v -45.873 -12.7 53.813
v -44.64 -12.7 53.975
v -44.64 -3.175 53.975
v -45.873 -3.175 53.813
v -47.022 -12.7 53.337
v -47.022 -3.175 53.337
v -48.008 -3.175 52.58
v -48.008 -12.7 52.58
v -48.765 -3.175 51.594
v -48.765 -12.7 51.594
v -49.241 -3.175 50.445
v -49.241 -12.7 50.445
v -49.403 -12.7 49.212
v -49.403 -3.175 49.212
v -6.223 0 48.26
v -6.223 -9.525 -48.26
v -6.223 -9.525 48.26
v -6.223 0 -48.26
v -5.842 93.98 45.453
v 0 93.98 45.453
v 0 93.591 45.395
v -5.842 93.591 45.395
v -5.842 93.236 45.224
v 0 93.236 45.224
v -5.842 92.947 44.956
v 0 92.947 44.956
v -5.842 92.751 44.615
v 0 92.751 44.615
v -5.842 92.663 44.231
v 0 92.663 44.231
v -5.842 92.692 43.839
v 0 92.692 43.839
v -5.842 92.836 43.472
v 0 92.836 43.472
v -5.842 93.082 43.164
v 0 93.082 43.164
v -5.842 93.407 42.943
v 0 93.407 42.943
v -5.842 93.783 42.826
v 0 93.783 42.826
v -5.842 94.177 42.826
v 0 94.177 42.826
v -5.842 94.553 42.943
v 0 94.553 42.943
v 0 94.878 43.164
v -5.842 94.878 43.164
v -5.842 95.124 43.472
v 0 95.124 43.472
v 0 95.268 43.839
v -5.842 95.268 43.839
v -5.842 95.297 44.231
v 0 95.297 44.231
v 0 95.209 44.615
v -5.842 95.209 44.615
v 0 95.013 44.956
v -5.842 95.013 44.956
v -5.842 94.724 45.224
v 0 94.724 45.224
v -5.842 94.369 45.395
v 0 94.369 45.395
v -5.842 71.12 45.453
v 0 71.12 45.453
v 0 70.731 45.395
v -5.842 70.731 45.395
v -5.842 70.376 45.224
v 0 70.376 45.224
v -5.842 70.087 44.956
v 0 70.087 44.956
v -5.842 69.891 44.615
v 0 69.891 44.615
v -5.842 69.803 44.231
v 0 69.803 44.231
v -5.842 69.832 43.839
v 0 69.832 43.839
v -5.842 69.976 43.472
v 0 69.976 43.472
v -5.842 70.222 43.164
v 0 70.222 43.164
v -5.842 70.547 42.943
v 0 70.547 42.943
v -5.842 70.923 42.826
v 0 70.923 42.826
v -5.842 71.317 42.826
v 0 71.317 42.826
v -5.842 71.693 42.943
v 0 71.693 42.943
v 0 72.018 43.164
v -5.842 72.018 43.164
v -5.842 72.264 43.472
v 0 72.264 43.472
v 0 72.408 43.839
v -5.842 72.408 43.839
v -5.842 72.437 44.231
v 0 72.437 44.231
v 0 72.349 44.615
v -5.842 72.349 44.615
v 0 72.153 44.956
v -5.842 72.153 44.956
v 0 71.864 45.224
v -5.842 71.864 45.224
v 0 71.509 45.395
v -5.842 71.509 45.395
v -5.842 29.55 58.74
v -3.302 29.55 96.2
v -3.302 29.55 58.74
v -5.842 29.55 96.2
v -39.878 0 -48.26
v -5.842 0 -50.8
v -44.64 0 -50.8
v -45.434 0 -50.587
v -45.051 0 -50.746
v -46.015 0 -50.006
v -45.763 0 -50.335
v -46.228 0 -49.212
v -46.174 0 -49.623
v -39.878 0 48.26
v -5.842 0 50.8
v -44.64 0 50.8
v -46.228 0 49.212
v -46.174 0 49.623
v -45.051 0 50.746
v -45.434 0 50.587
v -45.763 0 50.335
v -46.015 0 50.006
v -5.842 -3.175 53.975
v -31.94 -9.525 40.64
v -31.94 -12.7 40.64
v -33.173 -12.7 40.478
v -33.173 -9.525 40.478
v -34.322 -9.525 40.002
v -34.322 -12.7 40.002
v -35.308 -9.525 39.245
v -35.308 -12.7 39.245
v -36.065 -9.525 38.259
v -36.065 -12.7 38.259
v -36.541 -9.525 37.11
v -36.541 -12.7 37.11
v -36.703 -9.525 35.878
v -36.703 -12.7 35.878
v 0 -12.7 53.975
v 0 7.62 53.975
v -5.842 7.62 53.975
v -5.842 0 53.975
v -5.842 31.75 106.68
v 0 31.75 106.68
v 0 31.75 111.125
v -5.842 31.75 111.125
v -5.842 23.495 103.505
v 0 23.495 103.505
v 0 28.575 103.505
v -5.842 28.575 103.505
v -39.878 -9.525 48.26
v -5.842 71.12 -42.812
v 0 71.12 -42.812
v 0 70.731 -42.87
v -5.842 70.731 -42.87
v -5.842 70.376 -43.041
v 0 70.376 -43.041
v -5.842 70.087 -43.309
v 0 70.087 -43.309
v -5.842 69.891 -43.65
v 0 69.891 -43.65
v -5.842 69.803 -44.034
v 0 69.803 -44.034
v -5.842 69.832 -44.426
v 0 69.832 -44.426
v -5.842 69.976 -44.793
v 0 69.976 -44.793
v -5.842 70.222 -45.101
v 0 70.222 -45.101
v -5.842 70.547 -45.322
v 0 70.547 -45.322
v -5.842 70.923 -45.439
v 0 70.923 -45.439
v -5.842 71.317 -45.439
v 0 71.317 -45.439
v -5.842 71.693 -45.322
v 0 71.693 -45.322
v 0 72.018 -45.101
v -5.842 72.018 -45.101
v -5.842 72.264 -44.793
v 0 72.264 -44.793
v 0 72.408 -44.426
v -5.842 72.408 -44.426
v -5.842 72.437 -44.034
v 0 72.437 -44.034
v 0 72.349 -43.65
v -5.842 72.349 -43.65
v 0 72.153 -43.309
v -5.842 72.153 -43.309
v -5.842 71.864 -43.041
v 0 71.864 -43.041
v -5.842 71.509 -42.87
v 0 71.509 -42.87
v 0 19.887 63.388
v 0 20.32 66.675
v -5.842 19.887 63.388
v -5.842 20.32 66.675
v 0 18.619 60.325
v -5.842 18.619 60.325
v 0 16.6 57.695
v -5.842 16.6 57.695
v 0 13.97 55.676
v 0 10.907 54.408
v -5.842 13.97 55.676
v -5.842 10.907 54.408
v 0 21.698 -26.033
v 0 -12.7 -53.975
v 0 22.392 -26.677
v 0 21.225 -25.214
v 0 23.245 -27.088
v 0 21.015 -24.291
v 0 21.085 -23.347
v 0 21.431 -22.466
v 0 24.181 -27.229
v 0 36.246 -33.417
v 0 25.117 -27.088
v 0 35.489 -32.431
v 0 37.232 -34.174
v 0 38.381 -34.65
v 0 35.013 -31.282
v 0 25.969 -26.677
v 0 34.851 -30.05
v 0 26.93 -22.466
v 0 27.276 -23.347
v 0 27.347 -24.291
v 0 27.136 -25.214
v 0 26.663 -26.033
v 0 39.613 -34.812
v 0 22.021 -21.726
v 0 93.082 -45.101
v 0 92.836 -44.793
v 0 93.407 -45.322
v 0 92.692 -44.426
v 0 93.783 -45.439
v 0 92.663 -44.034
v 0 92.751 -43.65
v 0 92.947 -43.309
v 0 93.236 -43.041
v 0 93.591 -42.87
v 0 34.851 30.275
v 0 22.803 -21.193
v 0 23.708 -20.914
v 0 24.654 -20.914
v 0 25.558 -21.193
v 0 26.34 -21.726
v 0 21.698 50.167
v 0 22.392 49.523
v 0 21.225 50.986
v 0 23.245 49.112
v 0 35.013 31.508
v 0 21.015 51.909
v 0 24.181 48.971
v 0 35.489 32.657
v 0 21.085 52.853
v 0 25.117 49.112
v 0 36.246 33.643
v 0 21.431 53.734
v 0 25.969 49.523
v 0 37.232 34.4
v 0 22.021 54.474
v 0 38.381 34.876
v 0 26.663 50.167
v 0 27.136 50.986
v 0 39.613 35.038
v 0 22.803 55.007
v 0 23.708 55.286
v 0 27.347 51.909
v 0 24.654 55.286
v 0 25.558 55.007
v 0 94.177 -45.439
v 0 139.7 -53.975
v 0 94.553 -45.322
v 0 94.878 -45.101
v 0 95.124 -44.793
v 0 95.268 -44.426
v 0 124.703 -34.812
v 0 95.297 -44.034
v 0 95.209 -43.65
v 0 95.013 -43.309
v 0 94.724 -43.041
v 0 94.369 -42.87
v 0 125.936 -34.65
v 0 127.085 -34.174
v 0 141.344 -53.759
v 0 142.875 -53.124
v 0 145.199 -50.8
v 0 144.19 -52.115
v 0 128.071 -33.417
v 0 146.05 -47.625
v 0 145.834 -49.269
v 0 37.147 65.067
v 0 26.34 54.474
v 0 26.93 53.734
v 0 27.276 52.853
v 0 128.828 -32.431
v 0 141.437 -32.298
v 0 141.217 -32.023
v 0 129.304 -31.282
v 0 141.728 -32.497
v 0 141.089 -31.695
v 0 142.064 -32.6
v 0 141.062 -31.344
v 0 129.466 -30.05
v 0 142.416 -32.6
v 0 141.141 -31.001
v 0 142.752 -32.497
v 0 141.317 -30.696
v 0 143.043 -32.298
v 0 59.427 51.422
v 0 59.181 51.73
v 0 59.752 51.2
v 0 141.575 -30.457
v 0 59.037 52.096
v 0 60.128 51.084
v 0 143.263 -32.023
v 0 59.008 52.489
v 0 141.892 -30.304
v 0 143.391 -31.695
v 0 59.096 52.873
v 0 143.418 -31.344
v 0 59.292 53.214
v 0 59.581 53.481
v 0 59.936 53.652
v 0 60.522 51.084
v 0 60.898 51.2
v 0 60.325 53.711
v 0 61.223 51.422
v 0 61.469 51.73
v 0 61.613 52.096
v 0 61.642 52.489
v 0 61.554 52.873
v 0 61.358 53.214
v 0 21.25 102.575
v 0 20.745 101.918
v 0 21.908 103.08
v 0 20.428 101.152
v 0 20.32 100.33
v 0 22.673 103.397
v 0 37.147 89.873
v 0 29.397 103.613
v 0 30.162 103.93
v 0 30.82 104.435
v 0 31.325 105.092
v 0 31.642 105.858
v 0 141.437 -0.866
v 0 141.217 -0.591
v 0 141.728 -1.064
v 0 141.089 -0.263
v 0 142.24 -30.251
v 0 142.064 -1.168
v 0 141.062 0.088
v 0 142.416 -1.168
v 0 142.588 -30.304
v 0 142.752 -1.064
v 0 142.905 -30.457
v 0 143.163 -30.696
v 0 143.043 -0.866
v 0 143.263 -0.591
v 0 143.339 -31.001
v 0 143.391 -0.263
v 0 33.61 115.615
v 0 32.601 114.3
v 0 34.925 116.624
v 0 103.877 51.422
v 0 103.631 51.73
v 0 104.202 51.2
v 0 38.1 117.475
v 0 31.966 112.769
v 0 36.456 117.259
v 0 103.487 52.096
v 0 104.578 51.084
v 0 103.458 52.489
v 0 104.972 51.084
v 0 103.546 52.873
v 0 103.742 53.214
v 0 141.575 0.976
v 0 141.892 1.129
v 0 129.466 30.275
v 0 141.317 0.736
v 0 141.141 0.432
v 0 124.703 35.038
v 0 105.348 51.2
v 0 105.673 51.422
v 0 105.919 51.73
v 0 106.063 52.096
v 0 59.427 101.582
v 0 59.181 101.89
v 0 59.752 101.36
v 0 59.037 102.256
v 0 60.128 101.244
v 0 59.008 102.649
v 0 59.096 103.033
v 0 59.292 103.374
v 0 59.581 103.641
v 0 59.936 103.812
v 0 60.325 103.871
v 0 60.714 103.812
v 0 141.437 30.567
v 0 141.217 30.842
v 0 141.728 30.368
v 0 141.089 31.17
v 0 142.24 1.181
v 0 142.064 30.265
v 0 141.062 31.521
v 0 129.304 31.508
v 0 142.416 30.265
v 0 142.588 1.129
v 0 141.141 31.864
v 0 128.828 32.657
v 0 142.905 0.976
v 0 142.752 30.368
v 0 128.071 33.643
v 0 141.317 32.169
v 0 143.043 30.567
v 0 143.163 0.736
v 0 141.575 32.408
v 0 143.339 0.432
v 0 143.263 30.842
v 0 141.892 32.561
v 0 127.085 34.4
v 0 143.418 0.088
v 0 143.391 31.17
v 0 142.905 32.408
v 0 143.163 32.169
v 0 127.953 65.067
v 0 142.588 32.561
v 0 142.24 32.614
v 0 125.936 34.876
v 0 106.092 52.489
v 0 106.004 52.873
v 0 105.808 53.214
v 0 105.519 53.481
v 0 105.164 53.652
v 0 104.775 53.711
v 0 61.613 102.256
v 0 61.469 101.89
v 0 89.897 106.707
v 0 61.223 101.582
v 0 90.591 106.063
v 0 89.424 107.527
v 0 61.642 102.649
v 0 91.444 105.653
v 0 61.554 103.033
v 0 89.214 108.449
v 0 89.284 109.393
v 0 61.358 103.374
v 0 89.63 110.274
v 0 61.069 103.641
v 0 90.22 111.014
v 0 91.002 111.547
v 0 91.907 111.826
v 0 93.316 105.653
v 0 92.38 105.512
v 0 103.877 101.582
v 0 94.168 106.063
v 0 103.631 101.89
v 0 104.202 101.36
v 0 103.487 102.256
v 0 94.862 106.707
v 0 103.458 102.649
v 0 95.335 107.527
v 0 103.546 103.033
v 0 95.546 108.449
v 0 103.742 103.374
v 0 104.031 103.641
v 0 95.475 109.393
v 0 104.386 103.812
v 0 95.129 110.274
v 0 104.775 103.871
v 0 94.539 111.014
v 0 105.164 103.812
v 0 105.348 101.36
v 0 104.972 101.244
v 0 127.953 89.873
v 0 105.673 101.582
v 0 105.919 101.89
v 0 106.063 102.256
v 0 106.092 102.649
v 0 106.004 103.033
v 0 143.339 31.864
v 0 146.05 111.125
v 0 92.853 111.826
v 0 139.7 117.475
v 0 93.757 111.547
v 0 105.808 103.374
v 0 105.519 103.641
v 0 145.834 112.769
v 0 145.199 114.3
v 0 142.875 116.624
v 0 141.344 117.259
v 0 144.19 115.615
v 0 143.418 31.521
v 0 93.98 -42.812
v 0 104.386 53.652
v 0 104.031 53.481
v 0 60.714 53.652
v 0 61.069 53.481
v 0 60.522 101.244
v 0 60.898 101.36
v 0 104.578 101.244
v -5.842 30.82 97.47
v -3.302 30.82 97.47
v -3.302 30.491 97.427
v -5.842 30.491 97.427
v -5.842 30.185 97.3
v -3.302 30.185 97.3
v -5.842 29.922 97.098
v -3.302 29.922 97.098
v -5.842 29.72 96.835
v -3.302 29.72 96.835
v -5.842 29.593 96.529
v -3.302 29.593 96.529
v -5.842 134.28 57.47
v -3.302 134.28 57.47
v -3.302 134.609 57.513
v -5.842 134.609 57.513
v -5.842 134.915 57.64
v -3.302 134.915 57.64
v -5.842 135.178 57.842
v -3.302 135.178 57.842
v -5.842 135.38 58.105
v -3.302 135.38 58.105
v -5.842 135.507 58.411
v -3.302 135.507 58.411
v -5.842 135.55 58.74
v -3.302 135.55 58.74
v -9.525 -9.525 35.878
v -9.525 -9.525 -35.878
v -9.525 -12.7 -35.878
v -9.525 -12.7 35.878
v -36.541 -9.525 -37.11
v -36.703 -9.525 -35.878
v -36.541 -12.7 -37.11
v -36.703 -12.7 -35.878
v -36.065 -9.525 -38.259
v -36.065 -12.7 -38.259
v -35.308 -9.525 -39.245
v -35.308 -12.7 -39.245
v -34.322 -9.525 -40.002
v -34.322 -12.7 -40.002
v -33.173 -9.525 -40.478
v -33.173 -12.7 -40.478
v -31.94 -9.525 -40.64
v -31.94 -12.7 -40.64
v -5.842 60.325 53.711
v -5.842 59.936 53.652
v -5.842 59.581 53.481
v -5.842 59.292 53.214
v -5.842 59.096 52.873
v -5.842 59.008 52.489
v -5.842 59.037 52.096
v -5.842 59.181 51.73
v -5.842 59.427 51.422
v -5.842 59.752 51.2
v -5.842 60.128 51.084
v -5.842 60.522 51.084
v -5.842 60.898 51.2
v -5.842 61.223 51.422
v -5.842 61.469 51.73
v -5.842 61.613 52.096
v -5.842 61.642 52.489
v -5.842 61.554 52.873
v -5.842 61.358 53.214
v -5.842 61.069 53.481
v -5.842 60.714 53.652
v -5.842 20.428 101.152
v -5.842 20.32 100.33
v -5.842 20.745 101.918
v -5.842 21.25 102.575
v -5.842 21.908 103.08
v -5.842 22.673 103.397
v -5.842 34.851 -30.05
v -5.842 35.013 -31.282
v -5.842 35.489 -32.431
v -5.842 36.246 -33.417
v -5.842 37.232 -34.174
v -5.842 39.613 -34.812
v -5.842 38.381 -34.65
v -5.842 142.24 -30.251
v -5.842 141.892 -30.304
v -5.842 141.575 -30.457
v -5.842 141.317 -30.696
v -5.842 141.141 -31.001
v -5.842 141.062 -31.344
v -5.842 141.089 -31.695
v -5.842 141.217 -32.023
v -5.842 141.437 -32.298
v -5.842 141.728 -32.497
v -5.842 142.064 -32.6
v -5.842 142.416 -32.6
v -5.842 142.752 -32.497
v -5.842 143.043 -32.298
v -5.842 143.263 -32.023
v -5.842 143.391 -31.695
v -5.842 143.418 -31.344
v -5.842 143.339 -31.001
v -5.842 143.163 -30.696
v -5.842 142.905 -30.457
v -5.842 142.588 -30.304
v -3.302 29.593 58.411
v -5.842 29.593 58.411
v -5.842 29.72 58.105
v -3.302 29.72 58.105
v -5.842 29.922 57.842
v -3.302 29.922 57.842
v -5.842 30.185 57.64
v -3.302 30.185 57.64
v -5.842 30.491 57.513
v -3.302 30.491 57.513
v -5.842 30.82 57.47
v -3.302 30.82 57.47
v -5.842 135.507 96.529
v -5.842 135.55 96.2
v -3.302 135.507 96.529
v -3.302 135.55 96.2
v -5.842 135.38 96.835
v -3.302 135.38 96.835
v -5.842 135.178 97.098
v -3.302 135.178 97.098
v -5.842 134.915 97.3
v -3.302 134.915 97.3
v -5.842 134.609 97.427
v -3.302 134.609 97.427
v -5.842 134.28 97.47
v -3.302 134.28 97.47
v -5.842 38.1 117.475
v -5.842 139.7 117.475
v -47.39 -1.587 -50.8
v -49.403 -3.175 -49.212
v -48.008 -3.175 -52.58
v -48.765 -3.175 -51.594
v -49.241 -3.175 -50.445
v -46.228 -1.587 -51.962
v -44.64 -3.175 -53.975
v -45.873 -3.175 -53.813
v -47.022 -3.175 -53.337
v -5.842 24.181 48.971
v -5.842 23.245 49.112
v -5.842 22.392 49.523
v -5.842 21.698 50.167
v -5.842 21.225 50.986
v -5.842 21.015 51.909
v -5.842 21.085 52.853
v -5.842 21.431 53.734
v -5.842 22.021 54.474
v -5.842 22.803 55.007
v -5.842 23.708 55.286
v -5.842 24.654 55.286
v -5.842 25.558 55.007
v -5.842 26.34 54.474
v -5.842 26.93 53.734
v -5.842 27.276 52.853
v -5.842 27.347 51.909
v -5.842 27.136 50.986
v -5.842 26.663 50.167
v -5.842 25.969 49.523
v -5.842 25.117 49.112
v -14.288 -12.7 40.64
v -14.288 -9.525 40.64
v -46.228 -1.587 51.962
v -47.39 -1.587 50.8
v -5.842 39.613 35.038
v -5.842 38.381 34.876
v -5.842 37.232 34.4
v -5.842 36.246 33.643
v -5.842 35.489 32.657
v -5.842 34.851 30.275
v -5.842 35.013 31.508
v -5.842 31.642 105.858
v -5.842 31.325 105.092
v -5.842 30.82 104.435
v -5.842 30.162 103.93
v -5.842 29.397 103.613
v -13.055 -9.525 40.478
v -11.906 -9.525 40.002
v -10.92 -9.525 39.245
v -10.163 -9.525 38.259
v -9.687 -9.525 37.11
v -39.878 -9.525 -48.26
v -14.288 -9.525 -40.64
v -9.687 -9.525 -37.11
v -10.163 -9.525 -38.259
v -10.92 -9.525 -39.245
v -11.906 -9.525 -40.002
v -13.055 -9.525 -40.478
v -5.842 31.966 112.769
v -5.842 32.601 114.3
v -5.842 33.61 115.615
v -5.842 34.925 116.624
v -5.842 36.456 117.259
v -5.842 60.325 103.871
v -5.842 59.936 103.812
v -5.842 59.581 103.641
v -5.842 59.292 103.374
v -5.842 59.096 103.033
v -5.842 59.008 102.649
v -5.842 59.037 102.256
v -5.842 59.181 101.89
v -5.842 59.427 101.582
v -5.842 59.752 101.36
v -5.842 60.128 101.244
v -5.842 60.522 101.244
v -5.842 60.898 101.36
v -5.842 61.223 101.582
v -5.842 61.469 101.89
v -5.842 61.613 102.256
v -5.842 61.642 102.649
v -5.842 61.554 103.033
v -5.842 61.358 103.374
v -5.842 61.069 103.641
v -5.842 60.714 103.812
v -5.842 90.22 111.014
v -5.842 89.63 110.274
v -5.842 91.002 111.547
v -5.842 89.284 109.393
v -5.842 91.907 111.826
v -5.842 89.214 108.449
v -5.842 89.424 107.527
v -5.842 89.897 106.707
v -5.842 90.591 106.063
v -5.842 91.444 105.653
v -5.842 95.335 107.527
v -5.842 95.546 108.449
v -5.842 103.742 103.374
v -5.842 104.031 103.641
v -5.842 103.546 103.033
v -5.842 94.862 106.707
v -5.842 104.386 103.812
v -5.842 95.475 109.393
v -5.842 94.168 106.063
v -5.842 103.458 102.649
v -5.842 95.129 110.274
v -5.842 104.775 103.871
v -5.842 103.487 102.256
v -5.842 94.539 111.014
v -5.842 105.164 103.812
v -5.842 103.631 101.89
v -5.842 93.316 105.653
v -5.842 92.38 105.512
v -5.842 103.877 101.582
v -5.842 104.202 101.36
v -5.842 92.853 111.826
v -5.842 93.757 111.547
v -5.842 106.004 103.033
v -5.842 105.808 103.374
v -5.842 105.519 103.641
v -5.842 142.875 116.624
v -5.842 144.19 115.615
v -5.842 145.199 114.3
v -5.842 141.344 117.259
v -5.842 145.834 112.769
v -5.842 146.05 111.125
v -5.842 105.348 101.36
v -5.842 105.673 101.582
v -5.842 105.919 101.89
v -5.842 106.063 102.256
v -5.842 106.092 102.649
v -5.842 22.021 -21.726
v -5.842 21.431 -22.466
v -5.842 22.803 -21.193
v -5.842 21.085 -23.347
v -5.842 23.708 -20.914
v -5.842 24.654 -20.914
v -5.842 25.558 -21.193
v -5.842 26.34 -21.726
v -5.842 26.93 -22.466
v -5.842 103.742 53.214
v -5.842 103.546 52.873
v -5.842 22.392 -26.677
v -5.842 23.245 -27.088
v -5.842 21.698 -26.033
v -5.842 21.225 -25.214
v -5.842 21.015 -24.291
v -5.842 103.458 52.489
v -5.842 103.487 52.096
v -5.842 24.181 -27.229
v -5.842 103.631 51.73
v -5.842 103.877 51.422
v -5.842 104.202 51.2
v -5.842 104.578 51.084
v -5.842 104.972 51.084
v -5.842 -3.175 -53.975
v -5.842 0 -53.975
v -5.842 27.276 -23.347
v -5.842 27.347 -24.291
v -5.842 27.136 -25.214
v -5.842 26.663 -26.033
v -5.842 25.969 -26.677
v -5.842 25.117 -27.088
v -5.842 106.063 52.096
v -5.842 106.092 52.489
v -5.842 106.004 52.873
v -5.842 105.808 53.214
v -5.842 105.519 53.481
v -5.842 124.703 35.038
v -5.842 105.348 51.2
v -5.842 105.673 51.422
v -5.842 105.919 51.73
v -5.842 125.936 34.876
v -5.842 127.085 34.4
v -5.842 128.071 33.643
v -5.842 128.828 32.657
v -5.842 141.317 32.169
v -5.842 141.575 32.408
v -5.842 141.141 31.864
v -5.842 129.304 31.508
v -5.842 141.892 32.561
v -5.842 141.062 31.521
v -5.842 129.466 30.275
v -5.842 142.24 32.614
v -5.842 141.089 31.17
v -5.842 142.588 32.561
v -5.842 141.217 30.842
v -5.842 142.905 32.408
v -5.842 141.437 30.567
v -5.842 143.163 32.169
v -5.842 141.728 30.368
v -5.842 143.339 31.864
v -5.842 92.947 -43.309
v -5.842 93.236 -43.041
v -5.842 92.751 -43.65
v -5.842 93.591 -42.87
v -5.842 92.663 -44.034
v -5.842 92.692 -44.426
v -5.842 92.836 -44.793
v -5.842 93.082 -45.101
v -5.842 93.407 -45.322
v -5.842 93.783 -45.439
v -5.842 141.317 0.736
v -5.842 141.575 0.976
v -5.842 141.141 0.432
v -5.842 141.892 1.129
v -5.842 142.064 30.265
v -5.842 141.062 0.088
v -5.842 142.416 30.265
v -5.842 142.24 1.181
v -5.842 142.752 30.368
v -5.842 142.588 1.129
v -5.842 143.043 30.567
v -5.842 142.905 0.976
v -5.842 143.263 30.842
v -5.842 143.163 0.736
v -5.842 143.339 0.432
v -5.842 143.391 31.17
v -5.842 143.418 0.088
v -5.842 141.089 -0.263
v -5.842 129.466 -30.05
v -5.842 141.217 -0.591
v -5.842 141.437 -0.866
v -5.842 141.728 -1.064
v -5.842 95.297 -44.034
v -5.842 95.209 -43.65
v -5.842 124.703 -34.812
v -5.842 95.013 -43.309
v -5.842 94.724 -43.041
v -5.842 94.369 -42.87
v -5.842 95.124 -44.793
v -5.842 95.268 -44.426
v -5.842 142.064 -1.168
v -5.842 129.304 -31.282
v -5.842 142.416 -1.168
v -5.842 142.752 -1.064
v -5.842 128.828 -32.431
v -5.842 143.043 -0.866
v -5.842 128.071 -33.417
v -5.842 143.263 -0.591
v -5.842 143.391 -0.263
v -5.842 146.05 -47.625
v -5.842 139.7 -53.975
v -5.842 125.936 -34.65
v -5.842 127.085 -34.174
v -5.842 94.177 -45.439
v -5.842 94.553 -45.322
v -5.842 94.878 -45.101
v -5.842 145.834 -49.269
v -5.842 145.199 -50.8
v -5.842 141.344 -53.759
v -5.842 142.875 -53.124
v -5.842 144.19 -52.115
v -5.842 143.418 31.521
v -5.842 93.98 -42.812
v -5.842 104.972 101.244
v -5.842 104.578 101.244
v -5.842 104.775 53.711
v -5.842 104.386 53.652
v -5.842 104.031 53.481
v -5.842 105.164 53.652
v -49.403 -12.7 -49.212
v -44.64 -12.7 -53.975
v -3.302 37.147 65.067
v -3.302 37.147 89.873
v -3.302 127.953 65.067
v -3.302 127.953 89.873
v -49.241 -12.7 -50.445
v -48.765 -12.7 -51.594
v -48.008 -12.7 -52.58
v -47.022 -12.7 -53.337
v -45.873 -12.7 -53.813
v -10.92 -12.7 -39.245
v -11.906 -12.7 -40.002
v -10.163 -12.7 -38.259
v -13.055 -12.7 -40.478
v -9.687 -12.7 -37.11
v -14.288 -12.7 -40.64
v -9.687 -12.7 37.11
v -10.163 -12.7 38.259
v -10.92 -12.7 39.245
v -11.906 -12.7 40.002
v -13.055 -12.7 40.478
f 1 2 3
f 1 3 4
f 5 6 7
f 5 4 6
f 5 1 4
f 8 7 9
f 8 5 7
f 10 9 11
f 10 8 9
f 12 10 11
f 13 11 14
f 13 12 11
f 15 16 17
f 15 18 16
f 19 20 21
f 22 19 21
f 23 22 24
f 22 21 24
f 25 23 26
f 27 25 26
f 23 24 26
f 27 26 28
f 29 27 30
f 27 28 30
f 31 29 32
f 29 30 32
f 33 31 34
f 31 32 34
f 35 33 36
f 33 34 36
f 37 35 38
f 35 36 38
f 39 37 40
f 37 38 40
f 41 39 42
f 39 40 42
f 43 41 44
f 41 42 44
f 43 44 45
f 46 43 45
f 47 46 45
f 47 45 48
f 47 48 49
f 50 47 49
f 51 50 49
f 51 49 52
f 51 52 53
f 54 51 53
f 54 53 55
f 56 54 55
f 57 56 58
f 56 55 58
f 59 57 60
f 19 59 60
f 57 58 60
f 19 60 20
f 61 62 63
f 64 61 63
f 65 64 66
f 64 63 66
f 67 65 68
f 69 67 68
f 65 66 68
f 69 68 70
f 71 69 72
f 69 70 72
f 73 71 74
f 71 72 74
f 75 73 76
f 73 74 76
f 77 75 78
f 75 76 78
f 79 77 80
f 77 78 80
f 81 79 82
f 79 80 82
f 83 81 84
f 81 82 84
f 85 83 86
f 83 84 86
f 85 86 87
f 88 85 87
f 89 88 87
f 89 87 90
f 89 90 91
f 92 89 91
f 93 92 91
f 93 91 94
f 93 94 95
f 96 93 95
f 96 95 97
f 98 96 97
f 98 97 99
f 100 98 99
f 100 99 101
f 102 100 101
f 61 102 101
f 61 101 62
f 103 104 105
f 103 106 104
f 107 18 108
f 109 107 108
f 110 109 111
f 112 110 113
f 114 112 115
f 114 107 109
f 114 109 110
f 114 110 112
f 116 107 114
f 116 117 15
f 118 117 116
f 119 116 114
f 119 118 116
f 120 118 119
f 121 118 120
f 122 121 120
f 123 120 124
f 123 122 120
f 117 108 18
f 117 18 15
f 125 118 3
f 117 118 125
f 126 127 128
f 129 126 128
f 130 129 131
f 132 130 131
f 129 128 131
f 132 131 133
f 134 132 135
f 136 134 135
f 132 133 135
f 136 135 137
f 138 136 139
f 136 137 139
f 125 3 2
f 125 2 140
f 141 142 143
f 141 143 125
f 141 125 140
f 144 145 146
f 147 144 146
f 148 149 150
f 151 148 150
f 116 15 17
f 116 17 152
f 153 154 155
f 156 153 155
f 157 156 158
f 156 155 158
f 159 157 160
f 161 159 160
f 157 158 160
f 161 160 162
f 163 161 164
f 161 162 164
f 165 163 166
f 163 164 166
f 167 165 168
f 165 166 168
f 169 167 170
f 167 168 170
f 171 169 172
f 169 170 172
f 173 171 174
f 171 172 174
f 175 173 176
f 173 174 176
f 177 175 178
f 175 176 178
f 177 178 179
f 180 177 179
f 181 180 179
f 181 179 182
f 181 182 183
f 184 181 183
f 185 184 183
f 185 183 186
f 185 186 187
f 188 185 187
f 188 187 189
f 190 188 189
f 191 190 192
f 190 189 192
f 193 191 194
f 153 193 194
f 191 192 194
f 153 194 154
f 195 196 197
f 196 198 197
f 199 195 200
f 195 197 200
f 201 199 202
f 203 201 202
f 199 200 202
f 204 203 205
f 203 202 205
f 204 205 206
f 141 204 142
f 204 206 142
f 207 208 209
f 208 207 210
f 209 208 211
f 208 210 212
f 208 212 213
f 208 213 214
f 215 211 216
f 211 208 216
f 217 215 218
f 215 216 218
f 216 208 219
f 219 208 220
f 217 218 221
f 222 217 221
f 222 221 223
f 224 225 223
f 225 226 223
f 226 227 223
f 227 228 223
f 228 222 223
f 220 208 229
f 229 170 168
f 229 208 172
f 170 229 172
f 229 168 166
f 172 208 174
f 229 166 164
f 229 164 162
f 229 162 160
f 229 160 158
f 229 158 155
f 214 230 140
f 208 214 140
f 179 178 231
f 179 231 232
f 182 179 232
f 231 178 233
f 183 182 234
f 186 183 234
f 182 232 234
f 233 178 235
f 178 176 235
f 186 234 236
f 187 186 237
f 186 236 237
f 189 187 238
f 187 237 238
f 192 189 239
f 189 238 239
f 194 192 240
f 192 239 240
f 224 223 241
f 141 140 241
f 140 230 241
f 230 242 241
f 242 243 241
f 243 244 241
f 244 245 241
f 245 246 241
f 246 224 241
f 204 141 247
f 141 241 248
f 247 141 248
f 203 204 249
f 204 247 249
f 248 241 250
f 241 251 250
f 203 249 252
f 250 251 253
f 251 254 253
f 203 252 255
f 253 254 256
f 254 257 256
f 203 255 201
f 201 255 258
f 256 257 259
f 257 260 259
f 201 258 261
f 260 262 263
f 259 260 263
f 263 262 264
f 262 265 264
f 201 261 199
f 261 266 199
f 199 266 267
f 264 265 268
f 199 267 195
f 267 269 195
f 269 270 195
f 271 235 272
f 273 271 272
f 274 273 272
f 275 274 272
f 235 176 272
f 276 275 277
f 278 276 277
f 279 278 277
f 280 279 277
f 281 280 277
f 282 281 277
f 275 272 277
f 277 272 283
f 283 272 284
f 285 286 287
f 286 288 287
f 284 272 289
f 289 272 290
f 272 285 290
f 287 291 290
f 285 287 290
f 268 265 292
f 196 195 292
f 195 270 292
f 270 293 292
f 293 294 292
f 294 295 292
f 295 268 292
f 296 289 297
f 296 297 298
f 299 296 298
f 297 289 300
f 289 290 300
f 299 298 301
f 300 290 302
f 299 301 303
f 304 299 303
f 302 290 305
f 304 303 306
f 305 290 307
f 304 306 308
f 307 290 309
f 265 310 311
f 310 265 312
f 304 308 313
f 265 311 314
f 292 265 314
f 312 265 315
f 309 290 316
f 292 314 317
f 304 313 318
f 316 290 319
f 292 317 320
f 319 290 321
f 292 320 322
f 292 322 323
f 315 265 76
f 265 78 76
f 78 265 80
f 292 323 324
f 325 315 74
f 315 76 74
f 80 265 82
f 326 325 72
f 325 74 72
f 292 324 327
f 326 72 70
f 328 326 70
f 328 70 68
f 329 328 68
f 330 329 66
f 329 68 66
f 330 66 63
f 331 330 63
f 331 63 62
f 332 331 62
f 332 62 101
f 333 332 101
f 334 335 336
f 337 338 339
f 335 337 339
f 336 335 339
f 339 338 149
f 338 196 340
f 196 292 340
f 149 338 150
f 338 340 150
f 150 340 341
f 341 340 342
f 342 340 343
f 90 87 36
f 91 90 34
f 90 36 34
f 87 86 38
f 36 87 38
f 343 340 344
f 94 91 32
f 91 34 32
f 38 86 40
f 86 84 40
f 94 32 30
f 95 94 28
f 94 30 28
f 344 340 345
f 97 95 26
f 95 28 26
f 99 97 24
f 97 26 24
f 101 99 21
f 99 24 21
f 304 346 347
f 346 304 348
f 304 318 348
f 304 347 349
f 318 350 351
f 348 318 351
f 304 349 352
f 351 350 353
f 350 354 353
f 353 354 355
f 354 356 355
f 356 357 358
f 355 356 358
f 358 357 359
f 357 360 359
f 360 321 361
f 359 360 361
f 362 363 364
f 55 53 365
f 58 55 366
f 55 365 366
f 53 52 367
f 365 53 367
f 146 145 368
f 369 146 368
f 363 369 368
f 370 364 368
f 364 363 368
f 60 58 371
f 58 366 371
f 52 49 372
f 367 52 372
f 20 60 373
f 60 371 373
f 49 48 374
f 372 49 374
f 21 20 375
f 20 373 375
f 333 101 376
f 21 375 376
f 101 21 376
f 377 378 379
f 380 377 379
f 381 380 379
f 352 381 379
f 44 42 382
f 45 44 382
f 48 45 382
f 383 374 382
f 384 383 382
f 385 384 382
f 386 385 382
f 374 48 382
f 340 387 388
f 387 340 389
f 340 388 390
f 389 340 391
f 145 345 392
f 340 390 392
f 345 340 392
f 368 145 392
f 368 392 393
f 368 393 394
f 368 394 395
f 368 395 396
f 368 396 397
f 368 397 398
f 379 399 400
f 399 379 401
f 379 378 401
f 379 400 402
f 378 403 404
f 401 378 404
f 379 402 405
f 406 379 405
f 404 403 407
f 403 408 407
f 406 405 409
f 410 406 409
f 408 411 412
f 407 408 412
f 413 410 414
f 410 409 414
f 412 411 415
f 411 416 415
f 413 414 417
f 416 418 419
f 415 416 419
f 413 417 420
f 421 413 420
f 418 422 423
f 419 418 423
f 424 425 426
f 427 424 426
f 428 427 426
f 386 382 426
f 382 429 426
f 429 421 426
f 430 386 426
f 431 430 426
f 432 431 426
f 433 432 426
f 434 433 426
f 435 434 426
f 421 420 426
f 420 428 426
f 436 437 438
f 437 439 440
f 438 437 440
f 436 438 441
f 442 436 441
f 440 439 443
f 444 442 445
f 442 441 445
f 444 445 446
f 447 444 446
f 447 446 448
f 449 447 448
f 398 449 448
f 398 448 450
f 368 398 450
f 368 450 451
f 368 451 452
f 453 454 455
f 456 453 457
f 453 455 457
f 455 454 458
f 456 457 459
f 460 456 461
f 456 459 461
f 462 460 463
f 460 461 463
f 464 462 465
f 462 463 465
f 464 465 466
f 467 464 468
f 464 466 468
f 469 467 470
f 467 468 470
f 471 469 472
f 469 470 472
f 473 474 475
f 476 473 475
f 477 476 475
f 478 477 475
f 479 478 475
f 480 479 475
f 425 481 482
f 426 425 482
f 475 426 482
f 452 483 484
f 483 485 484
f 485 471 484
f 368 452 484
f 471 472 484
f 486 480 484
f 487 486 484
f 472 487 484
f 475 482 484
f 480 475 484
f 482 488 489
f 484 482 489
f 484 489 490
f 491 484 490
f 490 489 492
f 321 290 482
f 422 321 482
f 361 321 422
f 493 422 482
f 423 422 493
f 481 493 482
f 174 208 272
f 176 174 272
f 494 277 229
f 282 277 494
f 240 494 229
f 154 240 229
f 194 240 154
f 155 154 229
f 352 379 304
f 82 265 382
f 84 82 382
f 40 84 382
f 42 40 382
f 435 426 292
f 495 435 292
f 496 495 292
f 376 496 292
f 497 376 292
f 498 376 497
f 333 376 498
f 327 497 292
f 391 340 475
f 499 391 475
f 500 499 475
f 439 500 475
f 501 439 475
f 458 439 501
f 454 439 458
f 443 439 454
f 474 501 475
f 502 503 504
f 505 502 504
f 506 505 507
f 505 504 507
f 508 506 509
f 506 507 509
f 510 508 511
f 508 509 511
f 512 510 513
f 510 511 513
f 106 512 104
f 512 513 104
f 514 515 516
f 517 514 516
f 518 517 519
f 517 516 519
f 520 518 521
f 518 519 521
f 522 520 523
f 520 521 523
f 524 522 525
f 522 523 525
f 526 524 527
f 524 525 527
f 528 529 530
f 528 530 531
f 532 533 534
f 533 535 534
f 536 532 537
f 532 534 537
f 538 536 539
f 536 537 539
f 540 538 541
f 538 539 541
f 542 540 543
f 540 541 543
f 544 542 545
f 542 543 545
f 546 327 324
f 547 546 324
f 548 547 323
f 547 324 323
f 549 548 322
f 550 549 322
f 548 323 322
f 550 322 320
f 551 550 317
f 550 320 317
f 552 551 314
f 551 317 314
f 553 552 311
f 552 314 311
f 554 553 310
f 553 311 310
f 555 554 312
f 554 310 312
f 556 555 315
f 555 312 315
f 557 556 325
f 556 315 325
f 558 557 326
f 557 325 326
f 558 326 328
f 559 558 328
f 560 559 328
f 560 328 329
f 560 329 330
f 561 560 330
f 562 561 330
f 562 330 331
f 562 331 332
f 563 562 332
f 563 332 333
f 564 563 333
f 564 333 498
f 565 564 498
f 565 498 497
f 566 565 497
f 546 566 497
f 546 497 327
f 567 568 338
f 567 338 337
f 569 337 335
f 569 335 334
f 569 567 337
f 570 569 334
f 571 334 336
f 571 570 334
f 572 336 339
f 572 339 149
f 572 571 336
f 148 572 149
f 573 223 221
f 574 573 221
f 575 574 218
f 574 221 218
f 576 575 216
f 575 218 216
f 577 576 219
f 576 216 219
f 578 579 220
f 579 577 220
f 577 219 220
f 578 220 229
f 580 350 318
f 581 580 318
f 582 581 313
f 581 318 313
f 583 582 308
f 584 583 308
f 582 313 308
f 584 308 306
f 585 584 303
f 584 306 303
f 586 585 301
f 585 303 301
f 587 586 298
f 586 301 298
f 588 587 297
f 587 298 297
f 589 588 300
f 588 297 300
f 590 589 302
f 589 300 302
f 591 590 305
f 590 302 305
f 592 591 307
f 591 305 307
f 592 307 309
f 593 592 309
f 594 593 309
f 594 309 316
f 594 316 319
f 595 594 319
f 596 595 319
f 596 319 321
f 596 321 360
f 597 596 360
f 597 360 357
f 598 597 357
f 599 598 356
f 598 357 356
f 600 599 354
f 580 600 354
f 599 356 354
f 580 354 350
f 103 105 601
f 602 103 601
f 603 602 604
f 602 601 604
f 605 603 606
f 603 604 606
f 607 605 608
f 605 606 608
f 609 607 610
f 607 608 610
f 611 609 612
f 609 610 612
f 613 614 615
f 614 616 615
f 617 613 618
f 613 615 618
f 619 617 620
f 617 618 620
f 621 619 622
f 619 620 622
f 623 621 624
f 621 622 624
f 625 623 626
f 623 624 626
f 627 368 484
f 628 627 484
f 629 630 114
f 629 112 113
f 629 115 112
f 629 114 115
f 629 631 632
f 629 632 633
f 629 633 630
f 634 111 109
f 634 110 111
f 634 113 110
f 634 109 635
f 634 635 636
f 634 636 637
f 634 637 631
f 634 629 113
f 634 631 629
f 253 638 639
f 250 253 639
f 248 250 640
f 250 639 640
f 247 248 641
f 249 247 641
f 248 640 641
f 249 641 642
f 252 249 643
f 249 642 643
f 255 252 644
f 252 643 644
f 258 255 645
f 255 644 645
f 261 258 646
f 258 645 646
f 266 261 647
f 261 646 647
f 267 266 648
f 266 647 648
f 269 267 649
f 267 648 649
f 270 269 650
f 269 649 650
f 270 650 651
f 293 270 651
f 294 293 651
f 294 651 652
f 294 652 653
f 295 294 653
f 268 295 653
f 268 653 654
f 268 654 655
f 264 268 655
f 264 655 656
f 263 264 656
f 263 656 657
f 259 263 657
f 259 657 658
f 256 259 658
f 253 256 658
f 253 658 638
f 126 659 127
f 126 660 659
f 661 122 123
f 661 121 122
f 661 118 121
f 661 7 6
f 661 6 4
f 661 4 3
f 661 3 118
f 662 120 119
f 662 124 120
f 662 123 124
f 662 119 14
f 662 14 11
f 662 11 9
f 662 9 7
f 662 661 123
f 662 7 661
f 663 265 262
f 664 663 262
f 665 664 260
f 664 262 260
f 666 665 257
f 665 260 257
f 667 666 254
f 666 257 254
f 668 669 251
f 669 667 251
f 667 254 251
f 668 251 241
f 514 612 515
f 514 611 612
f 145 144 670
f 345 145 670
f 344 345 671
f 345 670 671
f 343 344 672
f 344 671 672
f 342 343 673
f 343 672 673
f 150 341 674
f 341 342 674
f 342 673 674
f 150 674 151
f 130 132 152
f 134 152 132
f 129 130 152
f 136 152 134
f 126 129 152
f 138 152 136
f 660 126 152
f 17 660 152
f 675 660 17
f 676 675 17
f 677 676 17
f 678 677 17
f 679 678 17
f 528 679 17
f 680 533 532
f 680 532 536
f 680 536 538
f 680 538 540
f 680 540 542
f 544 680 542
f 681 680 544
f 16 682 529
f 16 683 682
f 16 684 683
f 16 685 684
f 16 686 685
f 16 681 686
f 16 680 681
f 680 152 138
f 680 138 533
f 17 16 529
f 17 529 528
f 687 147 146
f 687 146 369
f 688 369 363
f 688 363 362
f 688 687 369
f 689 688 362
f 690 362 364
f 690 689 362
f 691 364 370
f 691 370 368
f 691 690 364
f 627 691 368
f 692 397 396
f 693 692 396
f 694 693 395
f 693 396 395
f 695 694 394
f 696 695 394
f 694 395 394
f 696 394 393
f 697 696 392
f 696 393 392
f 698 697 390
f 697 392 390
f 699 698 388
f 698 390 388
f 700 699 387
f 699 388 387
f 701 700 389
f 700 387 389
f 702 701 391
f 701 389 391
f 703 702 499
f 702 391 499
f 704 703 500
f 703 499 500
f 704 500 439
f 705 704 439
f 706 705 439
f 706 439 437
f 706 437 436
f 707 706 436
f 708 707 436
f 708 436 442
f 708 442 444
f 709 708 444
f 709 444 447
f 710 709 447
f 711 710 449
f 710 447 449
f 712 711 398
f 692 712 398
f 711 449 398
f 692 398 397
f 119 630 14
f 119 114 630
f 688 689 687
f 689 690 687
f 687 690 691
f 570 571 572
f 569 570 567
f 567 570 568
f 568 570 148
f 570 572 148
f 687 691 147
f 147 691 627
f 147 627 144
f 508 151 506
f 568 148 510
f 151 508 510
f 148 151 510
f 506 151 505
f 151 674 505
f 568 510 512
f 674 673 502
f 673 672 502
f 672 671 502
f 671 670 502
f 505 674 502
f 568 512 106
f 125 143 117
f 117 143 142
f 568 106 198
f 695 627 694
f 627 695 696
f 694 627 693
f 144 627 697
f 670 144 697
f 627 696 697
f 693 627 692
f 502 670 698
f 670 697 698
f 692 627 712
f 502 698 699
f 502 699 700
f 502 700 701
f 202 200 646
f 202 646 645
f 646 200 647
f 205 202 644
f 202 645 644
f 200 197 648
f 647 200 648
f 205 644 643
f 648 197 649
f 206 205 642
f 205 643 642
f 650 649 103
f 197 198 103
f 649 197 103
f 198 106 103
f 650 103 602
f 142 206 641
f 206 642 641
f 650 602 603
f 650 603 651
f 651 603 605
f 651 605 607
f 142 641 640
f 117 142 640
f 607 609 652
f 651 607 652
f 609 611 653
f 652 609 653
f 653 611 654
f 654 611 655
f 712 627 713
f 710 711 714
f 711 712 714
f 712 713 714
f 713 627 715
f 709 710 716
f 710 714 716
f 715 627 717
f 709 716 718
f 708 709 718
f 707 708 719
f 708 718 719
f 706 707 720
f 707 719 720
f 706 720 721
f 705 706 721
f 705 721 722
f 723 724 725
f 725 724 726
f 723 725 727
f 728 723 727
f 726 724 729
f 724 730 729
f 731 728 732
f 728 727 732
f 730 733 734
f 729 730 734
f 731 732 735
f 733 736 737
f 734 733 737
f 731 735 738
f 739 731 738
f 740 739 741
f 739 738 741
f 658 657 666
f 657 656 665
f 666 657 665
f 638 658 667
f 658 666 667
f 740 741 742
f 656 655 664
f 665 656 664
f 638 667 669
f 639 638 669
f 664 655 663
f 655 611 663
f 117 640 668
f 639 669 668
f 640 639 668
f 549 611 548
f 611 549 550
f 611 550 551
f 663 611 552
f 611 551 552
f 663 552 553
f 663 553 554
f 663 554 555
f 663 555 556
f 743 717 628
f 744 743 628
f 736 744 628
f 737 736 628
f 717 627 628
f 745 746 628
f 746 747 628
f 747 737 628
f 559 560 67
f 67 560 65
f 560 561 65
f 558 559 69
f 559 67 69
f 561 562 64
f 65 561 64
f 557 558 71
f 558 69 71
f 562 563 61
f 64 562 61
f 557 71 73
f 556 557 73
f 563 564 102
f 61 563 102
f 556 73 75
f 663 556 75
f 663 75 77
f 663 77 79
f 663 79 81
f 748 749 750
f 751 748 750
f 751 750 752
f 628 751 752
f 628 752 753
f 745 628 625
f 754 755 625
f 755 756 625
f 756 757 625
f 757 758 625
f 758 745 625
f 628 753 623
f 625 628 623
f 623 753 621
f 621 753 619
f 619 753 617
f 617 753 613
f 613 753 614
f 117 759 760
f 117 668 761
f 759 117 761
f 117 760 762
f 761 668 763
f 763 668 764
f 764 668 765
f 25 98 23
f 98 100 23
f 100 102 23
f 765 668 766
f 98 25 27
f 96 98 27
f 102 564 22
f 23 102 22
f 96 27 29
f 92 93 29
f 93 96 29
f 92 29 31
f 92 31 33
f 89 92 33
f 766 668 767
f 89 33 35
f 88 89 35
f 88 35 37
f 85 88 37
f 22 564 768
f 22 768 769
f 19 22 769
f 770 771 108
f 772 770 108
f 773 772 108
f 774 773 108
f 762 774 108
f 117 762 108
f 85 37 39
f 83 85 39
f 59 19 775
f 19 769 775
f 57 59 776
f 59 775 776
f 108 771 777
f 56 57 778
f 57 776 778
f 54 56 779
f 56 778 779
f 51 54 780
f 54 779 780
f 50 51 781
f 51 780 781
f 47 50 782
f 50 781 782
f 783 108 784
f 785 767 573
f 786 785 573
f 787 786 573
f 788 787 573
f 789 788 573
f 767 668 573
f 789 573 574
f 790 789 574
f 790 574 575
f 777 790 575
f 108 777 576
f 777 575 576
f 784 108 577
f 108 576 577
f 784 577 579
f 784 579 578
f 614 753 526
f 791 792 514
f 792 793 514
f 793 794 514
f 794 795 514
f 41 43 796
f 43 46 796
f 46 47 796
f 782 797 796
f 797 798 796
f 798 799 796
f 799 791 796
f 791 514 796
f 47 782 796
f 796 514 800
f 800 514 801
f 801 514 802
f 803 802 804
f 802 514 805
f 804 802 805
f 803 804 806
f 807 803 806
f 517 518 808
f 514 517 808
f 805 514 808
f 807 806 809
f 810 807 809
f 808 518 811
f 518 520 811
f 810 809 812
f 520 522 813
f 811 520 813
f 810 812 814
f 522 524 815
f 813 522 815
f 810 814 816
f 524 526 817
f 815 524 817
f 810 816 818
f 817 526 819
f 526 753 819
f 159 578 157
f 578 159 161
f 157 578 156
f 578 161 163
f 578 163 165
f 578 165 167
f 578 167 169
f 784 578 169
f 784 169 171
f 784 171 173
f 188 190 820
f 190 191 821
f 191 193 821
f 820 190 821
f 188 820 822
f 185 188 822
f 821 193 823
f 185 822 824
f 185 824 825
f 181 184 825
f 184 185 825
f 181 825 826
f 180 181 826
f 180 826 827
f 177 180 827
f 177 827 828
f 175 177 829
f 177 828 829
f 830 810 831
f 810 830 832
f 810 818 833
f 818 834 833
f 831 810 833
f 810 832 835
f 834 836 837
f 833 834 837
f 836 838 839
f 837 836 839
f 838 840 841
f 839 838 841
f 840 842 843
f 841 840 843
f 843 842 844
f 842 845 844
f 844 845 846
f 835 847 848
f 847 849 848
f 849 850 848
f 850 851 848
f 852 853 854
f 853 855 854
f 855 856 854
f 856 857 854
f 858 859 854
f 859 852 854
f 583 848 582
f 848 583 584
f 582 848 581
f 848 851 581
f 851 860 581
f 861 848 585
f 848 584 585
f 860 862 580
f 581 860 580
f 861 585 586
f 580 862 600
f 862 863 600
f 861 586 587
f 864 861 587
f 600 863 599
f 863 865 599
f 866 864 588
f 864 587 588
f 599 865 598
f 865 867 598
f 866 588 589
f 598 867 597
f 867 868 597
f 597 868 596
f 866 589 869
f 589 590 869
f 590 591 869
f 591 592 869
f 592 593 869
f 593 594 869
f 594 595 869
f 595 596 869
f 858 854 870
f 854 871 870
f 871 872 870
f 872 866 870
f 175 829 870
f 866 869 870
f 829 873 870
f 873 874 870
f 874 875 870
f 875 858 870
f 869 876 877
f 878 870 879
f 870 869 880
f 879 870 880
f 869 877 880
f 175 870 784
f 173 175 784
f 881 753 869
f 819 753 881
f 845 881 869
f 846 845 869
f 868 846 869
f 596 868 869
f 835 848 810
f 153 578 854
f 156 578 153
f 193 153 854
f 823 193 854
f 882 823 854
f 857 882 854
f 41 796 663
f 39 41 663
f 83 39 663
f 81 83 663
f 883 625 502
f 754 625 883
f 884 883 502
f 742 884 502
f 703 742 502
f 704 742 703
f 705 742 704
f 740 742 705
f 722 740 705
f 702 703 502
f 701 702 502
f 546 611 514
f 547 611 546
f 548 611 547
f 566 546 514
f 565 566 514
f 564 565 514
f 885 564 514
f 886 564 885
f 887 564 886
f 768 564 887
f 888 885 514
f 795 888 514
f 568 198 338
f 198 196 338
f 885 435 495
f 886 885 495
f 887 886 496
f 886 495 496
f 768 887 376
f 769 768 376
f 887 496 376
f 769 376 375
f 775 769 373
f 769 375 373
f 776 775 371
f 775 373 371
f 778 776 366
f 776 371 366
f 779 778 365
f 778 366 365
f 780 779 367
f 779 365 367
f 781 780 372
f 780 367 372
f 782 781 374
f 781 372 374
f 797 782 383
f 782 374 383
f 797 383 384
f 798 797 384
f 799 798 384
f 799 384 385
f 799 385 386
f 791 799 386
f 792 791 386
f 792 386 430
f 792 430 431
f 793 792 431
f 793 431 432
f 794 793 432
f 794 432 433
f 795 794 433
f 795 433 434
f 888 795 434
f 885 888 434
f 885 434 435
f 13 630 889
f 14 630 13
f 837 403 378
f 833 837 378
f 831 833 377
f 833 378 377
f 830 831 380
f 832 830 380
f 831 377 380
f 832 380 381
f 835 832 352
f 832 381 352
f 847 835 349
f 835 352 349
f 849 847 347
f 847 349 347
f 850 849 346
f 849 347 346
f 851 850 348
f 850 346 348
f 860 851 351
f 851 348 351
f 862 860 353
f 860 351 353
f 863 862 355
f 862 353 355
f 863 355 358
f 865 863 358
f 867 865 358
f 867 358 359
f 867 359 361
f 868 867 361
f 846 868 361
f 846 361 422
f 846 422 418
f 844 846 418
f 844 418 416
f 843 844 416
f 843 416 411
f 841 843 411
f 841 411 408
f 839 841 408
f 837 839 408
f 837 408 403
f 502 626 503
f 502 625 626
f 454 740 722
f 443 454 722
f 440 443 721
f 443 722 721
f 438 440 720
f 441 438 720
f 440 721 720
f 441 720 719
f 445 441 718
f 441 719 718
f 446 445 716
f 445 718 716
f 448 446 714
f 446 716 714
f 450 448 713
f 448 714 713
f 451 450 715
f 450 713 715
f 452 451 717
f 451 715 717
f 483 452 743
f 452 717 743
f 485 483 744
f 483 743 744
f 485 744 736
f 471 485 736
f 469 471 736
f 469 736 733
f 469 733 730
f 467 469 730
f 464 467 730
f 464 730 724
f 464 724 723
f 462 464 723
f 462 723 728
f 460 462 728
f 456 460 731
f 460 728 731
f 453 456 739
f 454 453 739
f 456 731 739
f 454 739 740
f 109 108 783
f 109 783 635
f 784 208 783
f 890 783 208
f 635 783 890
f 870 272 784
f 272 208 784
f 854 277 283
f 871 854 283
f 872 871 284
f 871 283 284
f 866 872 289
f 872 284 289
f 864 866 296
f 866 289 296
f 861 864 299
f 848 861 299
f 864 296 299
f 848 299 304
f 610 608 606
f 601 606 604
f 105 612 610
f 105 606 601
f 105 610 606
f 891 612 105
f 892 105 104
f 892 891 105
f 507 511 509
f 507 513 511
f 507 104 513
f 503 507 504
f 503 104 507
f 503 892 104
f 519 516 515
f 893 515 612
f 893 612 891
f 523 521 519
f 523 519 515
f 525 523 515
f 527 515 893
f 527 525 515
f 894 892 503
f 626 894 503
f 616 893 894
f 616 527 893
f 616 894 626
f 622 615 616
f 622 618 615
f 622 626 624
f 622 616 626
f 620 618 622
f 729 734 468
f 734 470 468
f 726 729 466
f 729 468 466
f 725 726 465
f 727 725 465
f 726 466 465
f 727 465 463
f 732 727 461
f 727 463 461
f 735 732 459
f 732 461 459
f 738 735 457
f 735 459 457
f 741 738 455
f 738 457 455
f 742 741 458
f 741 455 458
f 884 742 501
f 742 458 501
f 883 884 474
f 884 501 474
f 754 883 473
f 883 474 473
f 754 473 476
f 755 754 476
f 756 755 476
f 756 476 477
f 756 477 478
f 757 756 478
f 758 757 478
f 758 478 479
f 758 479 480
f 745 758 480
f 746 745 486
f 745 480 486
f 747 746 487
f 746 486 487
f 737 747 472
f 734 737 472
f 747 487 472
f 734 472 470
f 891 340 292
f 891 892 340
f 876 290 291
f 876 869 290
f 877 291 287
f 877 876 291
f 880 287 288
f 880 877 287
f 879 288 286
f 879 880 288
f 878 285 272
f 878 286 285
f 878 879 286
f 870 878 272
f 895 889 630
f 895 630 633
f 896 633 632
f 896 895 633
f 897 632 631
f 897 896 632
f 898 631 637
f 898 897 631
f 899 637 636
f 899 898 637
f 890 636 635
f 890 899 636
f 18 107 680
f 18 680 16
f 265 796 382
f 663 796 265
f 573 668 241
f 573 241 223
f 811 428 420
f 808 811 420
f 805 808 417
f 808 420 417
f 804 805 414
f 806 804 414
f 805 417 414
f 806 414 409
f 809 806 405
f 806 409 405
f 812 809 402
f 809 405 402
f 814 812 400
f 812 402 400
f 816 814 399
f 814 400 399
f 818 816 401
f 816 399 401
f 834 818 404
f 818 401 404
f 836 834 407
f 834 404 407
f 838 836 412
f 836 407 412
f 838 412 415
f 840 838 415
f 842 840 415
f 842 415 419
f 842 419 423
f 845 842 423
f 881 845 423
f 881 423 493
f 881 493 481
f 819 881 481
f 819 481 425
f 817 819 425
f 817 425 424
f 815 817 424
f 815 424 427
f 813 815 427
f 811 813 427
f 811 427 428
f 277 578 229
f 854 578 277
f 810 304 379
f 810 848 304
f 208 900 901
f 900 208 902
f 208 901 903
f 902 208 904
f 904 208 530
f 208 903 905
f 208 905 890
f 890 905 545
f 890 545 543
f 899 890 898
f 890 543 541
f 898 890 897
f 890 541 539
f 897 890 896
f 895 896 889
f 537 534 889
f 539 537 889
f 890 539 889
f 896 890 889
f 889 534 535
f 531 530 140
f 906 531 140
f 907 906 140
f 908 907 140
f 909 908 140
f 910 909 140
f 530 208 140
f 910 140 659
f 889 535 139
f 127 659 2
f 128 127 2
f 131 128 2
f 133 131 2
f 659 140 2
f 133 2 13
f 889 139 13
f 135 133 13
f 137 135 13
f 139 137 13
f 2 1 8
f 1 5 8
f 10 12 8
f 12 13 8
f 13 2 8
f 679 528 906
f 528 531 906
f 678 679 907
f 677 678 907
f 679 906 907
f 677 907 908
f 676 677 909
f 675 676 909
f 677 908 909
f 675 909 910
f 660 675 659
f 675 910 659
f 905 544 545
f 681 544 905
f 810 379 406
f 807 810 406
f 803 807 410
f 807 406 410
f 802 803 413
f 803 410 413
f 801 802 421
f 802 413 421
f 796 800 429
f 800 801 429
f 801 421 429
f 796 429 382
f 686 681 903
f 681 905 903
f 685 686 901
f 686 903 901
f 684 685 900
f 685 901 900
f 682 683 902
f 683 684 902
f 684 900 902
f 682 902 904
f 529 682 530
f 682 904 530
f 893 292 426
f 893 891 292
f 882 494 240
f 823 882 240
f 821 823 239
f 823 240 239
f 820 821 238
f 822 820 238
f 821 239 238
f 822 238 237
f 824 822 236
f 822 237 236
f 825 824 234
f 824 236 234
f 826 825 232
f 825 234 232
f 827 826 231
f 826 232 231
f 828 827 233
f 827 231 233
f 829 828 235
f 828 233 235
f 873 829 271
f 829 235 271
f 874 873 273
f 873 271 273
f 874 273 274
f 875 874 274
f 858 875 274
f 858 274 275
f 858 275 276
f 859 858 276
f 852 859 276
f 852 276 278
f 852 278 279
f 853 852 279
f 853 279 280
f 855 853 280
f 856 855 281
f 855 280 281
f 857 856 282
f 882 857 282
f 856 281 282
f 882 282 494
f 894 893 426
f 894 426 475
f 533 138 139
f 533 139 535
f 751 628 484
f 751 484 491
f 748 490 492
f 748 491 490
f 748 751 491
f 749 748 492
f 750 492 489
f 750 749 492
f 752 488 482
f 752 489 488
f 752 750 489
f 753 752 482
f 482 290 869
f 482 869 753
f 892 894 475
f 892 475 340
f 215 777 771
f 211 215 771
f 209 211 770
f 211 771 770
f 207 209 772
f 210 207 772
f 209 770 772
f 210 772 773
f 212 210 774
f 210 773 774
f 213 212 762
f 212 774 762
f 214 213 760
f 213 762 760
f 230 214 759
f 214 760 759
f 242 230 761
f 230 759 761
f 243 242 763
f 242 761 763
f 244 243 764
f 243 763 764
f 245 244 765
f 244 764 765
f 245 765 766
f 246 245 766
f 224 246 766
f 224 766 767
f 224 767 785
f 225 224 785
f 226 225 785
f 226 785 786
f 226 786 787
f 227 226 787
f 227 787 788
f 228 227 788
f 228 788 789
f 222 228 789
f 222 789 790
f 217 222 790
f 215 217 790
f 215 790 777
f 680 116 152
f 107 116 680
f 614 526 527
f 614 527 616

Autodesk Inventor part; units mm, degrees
ref_plane "YZ Plane" through (0, 0, 0) normal (1, 0, 0) x (0, 1, 0)
ref_plane "XZ Plane" through (0, 0, 0) normal (0, 1, 0) x (-1, 0, 0)
ref_plane "XY Plane" through (0, 0, 0) normal (0, 0, 1) x (1, 0, 0)
sketch "Sketch1" plane through (0, 0, 0) normal (0, 1, 0) x (-1, 0, 0)
  line L0 (0, -75.565) -> (0, 75.565)
  line L1 (-9.8806, 0) -> (59.2836, 0)
  line L2 (36.703, -40.64) -> (9.525, -40.64)
  line L3 (9.525, -40.64) -> (9.525, 40.64)
  line L4 (9.525, 40.64) -> (36.703, 40.64)
  line L5 (36.703, 40.64) -> (36.703, -40.64)
  line L6 (36.703, -40.64) -> (9.525, 40.64) construction
  line L7 (9.525, -40.64) -> (36.703, 40.64) construction
  line L8 (0, -53.975) -> (49.403, -53.975)
  line L9 (49.403, -53.975) -> (49.403, 53.975)
  line L10 (49.403, 53.975) -> (0, 53.975)
  line L11 (0, 53.975) -> (0, -53.975)
  line L12 (0, -53.975) -> (49.403, 53.975) construction
  line L13 (49.403, -53.975) -> (0, 53.975) construction
  point P0 (0, 0)
  point P1 (23.114, 0)
  point P2 (24.7015, 0)
  dimension "d0" = 81.28
  dimension "d1" = 27.178
  dimension "d3" = 107.95
  dimension "d4" = 12.7
  dimension "d6" = 9.525
  dimension "d7" = 0
extrude "Extrusion1" add sketch "Sketch1" against normal blind 12.7 contours L0 L1 L3 L2 L5 L9 L8 | L0 L10 L9 L1 L5 L4 L3
sketch "Sketch2" plane through (0, 0, 0) normal (0, 1, 0) x (1, 0, 0)
  point P0 (0, 0)
sketch "Sketch4" plane through (0, 0, 0) normal (0, 1, 0) x (1, 0, 0)
  point P0 (0, 0)
sketch "Sketch5" plane through (0, 0, 0) normal (0, 1, 0) x (1, 0, 0)
  line L0 (9.8806, 0) -> (-59.2836, 0)
  line L1 (0, 75.565) -> (0, -75.565)
  line L2 (-39.878, 48.26) -> (-6.223, 48.26)
  line L3 (-6.223, 48.26) -> (-6.223, -48.26)
  line L4 (-6.223, -48.26) -> (-39.878, -48.26)
  line L5 (-39.878, -48.26) -> (-39.878, 48.26)
  line L6 (-39.878, 48.26) -> (-6.223, -48.26) construction
  line L7 (-6.223, 48.26) -> (-39.878, -48.26) construction
  line L8 (-9.525, 40.64) -> (-9.525, -40.64)
  point P0 (0, 0)
  point P1 (-23.0505, 0)
  dimension "d13" = 3.302
  dimension "d14" = 96.52
  dimension "d15" = 33.655
extrude "Extrusion3" cut sketch "Sketch5" against normal blind 9.525
sketch "Sketch3" plane through (0, 0, 53.975) normal (1, 0, 0) x (0, 0, -1)
  line L0 (0, 0) -> (0, -12.7)
  line L1 (0, 0) -> (107.95, 0)
  line L2 (107.95, 0) -> (107.95, -12.7)
  line L3 (107.95, 146.05) -> (0, 146.05)
  line L4 (0, 146.05) -> (0, 0)
  line L5 (0, 0) -> (107.95, 0)
  line L6 (107.95, 0) -> (107.95, 146.05)
  line L7 (107.95, 146.05) -> (0, 0) construction
  line L8 (0, 146.05) -> (107.95, 0) construction
  line L9 (0, 20.32) -> (-63.5, 20.32)
  line L10 (-63.5, 20.32) -> (-63.5, 146.05)
  line L11 (-63.5, 146.05) -> (0, 146.05)
  line L12 (107.95, -12.7) -> (0, -12.7)
  line L13 (-49.53, 20.32) -> (-49.53, 31.75)
  line L14 (-49.53, 31.75) -> (-63.5, 31.75)
  point P0 (53.975, 0)
  point P1 (53.975, 73.025)
  point P2 (1.8288, 24.1808)
  point P3 (78.0288, 24.1808)
  point P4 (-54.7116, 92.3798)
  dimension "d10" = 146.05
  dimension "d18" = 33.02
  dimension "d19" = 63.5
  dimension "d20" = 13.97
  dimension "d21" = 11.43
  dimension "d22" = 36.8808
  dimension "d23" = 29.9212
  dimension "d24" = 106.1212
  dimension "d32" = 162.6616
  dimension "d33" = 105.0798
extrude "Extrusion2" add sketch "Sketch3" against normal blind 5.842 contours L4 L3 L6 L1 | L9 L13 L14 L10 L11 L4
hole "Hole1" at (0, 24.1808, -24.0538) at (0, 24.1808, 52.1462) at (0, 92.3798, 108.6866) direction (-1, 0, 0) diameter 6.35 end through all
sketch "Sketch6" plane through (-5.842, 0, 53.975) normal (-1, 0, 0) x (0, 0, 1)
  line L0 (3.495, 135.55) -> (43.495, 135.55)
  line L1 (43.495, 135.55) -> (43.495, 29.55)
  line L2 (43.495, 29.55) -> (3.495, 29.55)
  line L3 (3.495, 29.55) -> (3.495, 135.55)
  line L4 (3.495, 135.55) -> (43.495, 29.55) construction
  line L5 (43.495, 135.55) -> (3.495, 29.55) construction
  line L6 (0, -12.7) -> (-107.95, -12.7)
  line L7 (-107.95, 0) -> (-107.95, -12.7)
  line L8 (48.575, 104.775) -> (-1.585, 104.775) construction
  line L9 (-1.585, 104.775) -> (-1.585, 60.325) construction
  line L10 (-1.585, 60.325) -> (48.575, 60.325) construction
  line L11 (48.575, 60.325) -> (48.575, 104.775) construction
  line L12 (48.575, 104.775) -> (-1.585, 60.325) construction
  line L13 (-1.585, 104.775) -> (48.575, 60.325) construction
  line L14 (-53.975, 177.8) -> (-53.975, -44.45) construction
  line L15 (-142.24, 0) -> (97.79, 0) construction
  line L16 (-98.1075, 93.98) -> (-9.8425, 93.98) construction
  line L17 (-9.8425, 93.98) -> (-9.8425, 71.12) construction
  line L18 (-9.8425, 71.12) -> (-98.1075, 71.12) construction
  line L19 (-98.1075, 71.12) -> (-98.1075, 93.98) construction
  line L20 (-98.1075, 93.98) -> (-9.8425, 71.12) construction
  line L21 (-9.8425, 93.98) -> (-98.1075, 71.12) construction
  point P0 (-53.975, 0)
  point P1 (23.495, 82.55)
  point P2 (-53.975, 82.55)
  dimension "d36" = 40
  dimension "d37" = 106
  dimension "d38" = 95.25
  dimension "d39" = 131.445
  dimension "d43" = 5.08
  dimension "d44" = 44.45
  dimension "d45" = 88.265
  dimension "d46" = 22.86
  dimension "d47" = 106.68
extrude "Extrusion4" cut sketch "Sketch6" against normal blind 2.54
fillet "Fillet3" radius 1.27 4 edges at (-4.572, 29.55, 97.47) (-4.572, 29.55, 57.47) (-4.572, 135.55, 57.47) (-4.572, 135.55, 97.47)
hole "Hole2" at (-5.842, 93.98, 44.1325) at (-5.842, 71.12, 44.1325) at (-5.842, 71.12, -44.1325) at (-5.842, 93.98, -44.1325) at (-5.842, 104.775, 52.39) at (-5.842, 60.325, 52.39) at (-5.842, 60.325, 102.55) at (-5.842, 104.775, 102.55) direction (1, 0, 0) diameter 2.6416 end through all
fillet "Fillet1" radius 3.175 2 edges at (-2.921, 31.75, 103.505) (-2.921, 20.32, 103.505)
fillet "Fillet2" radius 12.7 1 edges at (-2.921, 20.32, 53.975)
sketch "Sketch7" plane through (-5.842, 0, 53.975) normal (-1, 0, 0) x (0, 0, 1)
  line L0 (-98.1075, 93.98) -> (-9.8425, 93.98) construction
  circle A0 centre (-9.8425, 93.98) radius 1.3208 construction
  line L1 (-98.1075, 142.24) -> (-9.8425, 142.24) construction
  line L2 (-9.8425, 142.24) -> (-9.8425, 93.98) construction
  line L3 (-9.8425, 93.98) -> (-98.1075, 93.98) construction
  line L4 (-98.1075, 93.98) -> (-98.1075, 142.24) construction
  line L5 (-98.1075, 142.24) -> (-9.8425, 93.98) construction
  line L6 (-9.8425, 142.24) -> (-98.1075, 93.98) construction
  line L7 (63.5, 146.05) -> (-107.95, 146.05) construction
  point P0 (-53.975, 0)
  point P1 (-53.975, 118.11)
  point P2 (-53.975, 142.24)
  point P3 (-22.5425, 142.24)
  point P4 (-85.4075, 142.24)
  dimension "d55" = 3.81
  dimension "d75" = 12.7
  dimension "d76" = 12.7
hole "Hole3" at (-5.842, 142.24, 0) at (-5.842, 142.24, 31.4325) at (-5.842, 142.24, -31.4325) direction (1, 0, 0) diameter 2.3622 end through all
fillet "Fillet4" radius 6.35 3 edges at (-2.921, 146.05, 117.475) (-2.921, 146.05, -53.975) (-2.921, 31.75, 117.475)
fillet "Fillet5" radius 4.7625 2 edges at (-49.403, -6.35, 53.975) (-49.403, -6.35, -53.975)
sketch "Sketch8" plane through (-5.842, 0, 53.975) normal (-1, 0, 0) x (0, 0, 1)
  line L0 (-88.7872, 129.4659) -> (-18.9372, 129.4659)
  line L1 (-18.9372, 129.4659) -> (-18.9372, 34.8509)
  line L2 (-18.9372, 34.8509) -> (-88.7872, 34.8509)
  line L3 (-88.7872, 34.8509) -> (-88.7872, 129.4659)
  line L4 (-88.7872, 129.4659) -> (-18.9372, 34.8509) construction
  line L5 (-18.9372, 129.4659) -> (-88.7872, 34.8509) construction
  point P0 (-53.975, 0)
  point P1 (-53.8622, 82.1584)
  dimension "d65" = 69.85
  dimension "d66" = 94.615
extrude "Extrusion5" cut sketch "Sketch8" against normal through all
fillet "Fillet6" radius 4.7625 4 edges at (-2.921, 129.4659, 35.0378) (-2.921, 34.8509, -34.8122) (-2.921, 129.4659, -34.8122) (-2.921, 34.8509, 35.0378)
sketch "Sketch9" plane through (-3.302, 0, 53.975) normal (-1, 0, 0) x (0, 0, 1)
  arc A0 (43.495, 134.28) -> (42.225, 135.55) centre (42.225, 134.28) ccw
  line L0 (4.765, 135.55) -> (42.225, 135.55)
  arc A1 (4.765, 135.55) -> (3.495, 134.28) centre (4.765, 134.28) ccw
  line L1 (3.495, 30.82) -> (3.495, 134.28)
  arc A2 (3.495, 30.82) -> (4.765, 29.55) centre (4.765, 30.82) ccw
  line L2 (42.225, 29.55) -> (4.765, 29.55)
  arc A3 (42.225, 29.55) -> (43.495, 30.82) centre (42.225, 30.82) ccw
  line L3 (43.495, 134.28) -> (43.495, 30.82)
  line L4 (11.0923, 37.1473) -> (11.0923, 127.9527)
  line L5 (11.0923, 127.9527) -> (35.8977, 127.9527)
  line L6 (35.8977, 127.9527) -> (35.8977, 37.1473)
  line L7 (35.8977, 37.1473) -> (11.0923, 37.1473)
  point P0 (-53.975, 0)
  point P1 (23.495, 82.55)
extrude "Extrusion6" cut sketch "Sketch9" against normal through all contours L4 L5 L6 L7
chamfer "Chamfer1" distance 3.175 angle 45 5 edges at (-25.2413, 0, -53.975) (-48.0081, 0, -52.5801) (-49.403, 0, 0) (-48.0081, 0, 52.5801) (-25.2412, 0, 53.975)
fillet "Fillet7" radius 4.7625 4 edges at (-36.703, -11.1125, 40.64) (-9.525, -11.1125, 40.64) (-9.525, -11.1125, -40.64) (-36.703, -11.1125, -40.64)
properties material "ABS, BLACK"
